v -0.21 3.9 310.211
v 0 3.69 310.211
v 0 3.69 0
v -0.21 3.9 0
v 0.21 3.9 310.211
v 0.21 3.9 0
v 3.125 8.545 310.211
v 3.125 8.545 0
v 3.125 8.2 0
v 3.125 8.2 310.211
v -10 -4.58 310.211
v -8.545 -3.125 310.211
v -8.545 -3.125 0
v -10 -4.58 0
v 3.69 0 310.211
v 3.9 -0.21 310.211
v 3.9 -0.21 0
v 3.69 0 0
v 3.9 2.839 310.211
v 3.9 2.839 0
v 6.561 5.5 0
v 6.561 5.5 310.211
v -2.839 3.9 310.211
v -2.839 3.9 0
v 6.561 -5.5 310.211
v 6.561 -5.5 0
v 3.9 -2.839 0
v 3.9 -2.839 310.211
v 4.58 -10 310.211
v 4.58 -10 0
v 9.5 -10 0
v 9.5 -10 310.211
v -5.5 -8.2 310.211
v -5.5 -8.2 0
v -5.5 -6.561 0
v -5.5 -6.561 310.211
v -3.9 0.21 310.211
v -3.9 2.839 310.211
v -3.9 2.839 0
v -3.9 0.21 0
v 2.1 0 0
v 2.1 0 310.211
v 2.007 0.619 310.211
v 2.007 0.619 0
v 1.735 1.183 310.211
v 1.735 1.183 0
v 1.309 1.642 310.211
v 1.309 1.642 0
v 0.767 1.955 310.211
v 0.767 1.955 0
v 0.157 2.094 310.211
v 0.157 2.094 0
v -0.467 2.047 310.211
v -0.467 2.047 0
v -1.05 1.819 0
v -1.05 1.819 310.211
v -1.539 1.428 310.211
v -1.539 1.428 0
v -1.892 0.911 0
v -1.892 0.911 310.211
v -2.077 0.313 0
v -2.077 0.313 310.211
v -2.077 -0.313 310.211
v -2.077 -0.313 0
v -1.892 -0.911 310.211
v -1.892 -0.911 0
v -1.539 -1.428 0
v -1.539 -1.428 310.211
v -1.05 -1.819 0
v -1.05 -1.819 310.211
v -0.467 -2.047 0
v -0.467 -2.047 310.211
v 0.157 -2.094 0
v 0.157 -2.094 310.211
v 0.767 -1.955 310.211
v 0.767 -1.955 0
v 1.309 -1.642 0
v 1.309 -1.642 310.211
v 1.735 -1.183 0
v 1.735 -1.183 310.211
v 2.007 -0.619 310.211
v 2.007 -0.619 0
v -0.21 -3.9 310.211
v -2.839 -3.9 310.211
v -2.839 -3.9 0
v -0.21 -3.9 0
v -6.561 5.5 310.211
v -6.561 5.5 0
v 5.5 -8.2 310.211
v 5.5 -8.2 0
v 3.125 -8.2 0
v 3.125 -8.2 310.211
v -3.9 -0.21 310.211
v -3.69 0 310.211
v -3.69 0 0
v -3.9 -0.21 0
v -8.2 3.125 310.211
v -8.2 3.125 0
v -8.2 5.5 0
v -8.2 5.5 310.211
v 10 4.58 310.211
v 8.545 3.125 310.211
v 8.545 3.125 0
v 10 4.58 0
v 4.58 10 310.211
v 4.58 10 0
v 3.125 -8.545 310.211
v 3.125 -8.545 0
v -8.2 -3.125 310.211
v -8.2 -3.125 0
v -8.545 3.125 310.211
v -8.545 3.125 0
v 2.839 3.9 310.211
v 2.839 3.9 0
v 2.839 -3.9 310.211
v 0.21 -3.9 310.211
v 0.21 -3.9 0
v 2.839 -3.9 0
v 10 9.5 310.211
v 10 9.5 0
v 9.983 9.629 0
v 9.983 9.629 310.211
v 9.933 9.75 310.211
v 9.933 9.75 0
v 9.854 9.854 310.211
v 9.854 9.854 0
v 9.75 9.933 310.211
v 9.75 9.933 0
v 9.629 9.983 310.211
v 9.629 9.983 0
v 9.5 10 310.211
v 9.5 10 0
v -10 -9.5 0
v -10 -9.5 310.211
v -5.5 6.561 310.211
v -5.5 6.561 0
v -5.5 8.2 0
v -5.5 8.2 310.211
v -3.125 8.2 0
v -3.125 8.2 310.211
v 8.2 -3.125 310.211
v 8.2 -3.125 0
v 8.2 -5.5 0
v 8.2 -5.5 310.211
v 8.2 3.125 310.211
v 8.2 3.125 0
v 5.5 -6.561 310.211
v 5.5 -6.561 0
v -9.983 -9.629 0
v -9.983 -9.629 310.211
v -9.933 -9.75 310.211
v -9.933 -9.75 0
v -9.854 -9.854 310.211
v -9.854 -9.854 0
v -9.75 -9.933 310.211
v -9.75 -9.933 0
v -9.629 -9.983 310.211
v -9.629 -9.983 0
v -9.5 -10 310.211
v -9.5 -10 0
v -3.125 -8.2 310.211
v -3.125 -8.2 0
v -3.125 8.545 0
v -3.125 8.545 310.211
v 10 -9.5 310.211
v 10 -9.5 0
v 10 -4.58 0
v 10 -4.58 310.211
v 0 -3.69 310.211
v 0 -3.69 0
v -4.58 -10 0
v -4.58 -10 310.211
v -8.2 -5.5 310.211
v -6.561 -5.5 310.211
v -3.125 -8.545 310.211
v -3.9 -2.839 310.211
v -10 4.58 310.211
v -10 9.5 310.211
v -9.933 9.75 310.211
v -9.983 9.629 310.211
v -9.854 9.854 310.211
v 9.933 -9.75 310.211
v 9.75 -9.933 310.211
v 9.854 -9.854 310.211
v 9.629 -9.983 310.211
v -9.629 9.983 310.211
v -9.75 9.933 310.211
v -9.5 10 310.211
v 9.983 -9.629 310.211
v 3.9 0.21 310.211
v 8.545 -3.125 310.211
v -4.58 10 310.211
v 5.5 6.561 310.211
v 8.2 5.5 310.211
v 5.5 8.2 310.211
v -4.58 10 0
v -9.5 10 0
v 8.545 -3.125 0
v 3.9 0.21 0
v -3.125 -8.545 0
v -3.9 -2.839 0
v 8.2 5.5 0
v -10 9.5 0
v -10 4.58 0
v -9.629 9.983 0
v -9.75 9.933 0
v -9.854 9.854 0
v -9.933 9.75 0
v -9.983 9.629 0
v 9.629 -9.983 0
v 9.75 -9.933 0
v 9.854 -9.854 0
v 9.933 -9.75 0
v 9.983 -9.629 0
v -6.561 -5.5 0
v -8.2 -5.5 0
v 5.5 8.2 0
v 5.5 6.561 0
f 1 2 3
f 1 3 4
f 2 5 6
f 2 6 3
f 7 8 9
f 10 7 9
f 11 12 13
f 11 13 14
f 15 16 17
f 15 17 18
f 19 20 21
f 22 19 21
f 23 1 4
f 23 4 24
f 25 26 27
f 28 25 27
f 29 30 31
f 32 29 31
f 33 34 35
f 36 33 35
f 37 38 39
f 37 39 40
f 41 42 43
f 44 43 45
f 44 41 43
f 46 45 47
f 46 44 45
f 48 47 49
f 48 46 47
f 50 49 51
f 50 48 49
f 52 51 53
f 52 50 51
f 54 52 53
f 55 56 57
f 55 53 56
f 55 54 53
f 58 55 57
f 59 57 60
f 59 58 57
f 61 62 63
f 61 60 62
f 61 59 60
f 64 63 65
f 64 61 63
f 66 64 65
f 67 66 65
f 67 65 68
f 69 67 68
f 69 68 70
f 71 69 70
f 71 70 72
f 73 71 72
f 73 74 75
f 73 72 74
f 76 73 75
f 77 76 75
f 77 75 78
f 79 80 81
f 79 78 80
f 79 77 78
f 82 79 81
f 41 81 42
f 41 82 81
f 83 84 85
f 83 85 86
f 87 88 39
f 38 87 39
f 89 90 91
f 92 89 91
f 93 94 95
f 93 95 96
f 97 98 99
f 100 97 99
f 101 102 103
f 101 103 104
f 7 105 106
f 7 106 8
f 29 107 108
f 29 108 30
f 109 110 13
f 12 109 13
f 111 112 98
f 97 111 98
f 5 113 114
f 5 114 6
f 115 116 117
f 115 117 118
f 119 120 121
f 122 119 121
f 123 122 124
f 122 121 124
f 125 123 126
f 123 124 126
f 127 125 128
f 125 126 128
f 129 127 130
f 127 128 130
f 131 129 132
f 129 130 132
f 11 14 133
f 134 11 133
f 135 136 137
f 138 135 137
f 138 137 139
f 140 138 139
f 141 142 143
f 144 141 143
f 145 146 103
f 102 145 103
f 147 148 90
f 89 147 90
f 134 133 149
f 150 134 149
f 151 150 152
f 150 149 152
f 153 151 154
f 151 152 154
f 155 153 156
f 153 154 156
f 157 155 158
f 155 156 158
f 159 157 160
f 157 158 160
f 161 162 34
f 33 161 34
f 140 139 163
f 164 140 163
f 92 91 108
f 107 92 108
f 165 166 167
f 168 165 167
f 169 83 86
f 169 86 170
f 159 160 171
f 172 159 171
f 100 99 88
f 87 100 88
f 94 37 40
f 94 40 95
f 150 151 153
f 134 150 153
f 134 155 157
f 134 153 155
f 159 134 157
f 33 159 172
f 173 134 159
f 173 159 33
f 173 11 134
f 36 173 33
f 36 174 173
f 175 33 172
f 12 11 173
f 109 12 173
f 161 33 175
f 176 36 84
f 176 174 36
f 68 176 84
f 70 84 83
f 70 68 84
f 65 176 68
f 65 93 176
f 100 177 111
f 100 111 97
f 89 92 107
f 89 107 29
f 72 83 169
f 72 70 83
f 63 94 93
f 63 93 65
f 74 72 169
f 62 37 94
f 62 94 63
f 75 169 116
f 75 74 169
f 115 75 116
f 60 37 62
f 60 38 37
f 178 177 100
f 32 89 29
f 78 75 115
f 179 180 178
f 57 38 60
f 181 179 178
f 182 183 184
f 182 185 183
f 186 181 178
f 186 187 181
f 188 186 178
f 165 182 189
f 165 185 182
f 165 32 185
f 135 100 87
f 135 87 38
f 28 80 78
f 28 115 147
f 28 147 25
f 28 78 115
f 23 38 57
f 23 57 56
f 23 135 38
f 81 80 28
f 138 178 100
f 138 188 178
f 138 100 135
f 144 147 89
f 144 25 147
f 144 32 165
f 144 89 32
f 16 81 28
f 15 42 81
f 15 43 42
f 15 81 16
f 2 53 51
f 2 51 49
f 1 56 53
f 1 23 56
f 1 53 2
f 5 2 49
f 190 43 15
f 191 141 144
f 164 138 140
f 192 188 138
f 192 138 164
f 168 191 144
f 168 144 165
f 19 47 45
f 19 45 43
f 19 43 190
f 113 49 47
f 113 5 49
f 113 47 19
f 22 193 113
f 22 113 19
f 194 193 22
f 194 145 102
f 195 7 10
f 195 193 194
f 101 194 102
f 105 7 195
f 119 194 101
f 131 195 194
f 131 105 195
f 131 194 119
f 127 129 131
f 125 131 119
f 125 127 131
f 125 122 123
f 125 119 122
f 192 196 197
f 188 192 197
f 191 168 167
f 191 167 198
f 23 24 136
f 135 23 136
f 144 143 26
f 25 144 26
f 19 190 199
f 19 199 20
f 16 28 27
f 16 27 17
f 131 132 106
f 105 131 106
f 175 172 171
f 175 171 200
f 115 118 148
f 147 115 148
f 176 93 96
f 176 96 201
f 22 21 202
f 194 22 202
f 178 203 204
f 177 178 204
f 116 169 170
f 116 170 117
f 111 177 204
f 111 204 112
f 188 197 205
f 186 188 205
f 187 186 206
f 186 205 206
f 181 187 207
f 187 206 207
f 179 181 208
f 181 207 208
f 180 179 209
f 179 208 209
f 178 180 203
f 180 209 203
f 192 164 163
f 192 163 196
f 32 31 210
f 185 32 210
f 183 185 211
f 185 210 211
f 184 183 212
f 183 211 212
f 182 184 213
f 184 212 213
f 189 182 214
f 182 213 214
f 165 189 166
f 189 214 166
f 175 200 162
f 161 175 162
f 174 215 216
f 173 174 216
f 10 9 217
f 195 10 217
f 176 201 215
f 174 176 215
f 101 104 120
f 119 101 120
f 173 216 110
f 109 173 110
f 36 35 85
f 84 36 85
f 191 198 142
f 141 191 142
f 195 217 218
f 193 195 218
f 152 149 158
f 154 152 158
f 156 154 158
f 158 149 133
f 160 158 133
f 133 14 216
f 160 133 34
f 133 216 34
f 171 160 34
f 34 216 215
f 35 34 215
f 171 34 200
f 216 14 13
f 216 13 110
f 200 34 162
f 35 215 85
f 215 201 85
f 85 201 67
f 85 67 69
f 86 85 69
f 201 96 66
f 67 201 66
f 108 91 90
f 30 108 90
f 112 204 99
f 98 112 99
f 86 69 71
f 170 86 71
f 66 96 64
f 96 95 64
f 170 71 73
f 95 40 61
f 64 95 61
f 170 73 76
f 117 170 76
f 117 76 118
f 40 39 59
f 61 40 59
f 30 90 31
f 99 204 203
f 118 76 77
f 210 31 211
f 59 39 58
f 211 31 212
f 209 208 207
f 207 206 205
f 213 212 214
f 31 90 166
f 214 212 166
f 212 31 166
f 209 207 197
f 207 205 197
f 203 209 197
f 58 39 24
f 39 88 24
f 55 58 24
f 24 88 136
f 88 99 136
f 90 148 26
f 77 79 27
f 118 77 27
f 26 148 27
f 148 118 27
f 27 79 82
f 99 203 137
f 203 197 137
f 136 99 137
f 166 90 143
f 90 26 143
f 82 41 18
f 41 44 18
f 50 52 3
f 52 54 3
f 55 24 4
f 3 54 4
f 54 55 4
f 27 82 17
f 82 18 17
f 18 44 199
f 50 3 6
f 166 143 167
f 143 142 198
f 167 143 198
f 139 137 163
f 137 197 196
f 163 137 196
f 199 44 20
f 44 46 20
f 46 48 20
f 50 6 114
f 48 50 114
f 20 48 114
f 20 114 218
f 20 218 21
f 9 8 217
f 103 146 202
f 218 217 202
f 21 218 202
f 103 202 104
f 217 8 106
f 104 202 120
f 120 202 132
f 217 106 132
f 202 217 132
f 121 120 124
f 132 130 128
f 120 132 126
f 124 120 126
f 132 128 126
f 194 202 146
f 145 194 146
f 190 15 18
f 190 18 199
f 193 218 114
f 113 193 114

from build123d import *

# Parameters (mm, degrees)
SKETCH1_R           = 2.1
BOSS_EXTRUDE1_DEPTH = 500
SKETCH2_W           = 54.342880418
SKETCH2_H           = 45.441204662
CUT_EXTRUDE1_DEPTH  = 189.7888


with BuildPart() as part:
    # Sketch1 → Boss-Extrude1 (new body)
    with BuildSketch(Plane.XY):
        with BuildLine():
            Line((4.58, -10), (9.5, -10))
            ThreePointArc((9.5, -10), (9.853553391, -9.853553391), (10, -9.5))
            Line((10, -9.5), (10, -4.58))
            Line((10, -4.58), (8.545, -3.125))
            Line((8.545, -3.125), (8.2, -3.125))
            Line((8.2, -3.125), (8.2, -5.5))
            Line((8.2, -5.5), (6.560660172, -5.5))
            Line((6.560660172, -5.5), (3.9, -2.839339828))
            Line((3.9, -2.839339828), (3.9, -0.21))
            Line((3.9, -0.21), (3.69, 0))
            Line((3.69, 0), (3.9, 0.21))
            Line((3.9, 0.21), (3.9, 2.839339828))
            Line((3.9, 2.839339828), (6.560660172, 5.5))
            Line((6.560660172, 5.5), (8.2, 5.5))
            Line((8.2, 5.5), (8.2, 3.125))
            Line((8.2, 3.125), (8.545, 3.125))
            Line((8.545, 3.125), (10, 4.58))
            Line((10, 4.58), (10, 9.5))
            ThreePointArc((10, 9.5), (9.853553391, 9.853553391), (9.5, 10))
            Line((9.5, 10), (4.58, 10))
            Line((4.58, 10), (3.125, 8.545))
            Line((3.125, 8.545), (3.125, 8.2))
            Line((3.125, 8.2), (5.5, 8.2))
            Line((5.5, 8.2), (5.5, 6.560660172))
            Line((5.5, 6.560660172), (2.839339828, 3.9))
            Line((2.839339828, 3.9), (0.21, 3.9))
            Line((0.21, 3.9), (0, 3.69))
            Line((0, 3.69), (-0.21, 3.9))
            Line((-0.21, 3.9), (-2.839339828, 3.9))
            Line((-2.839339828, 3.9), (-5.5, 6.560660172))
            Line((-5.5, 6.560660172), (-5.5, 8.2))
            Line((-5.5, 8.2), (-3.125, 8.2))
            Line((-3.125, 8.2), (-3.125, 8.545))
            Line((-3.125, 8.545), (-4.58, 10))
            Line((-4.58, 10), (-9.5, 10))
            ThreePointArc((-9.5, 10), (-9.853553391, 9.853553391), (-10, 9.5))
            Line((-10, 9.5), (-10, 4.58))
            Line((-10, 4.58), (-8.545, 3.125))
            Line((-8.545, 3.125), (-8.2, 3.125))
            Line((-8.2, 3.125), (-8.2, 5.5))
            Line((-8.2, 5.5), (-6.560660172, 5.5))
            Line((-6.560660172, 5.5), (-3.9, 2.839339828))
            Line((-3.9, 2.839339828), (-3.9, 0.21))
            Line((-3.9, 0.21), (-3.69, 0))
            Line((-3.69, 0), (-3.9, -0.21))
            Line((-3.9, -0.21), (-3.9, -2.839339828))
            Line((-3.9, -2.839339828), (-6.560660172, -5.5))
            Line((-6.560660172, -5.5), (-8.2, -5.5))
            Line((-8.2, -5.5), (-8.2, -3.125))
            Line((-8.2, -3.125), (-8.545, -3.125))
            Line((-8.545, -3.125), (-10, -4.58))
            Line((-10, -4.58), (-10, -9.5))
            ThreePointArc((-10, -9.5), (-9.853553391, -9.853553391), (-9.5, -10))
            Line((-9.5, -10), (-4.58, -10))
            Line((-4.58, -10), (-3.125, -8.545))
            Line((-3.125, -8.545), (-3.125, -8.2))
            Line((-3.125, -8.2), (-5.5, -8.2))
            Line((-5.5, -8.2), (-5.5, -6.560660172))
            Line((-5.5, -6.560660172), (-2.839339828, -3.9))
            Line((-2.839339828, -3.9), (-0.21, -3.9))
            Line((-0.21, -3.9), (0, -3.69))
            Line((0, -3.69), (0.21, -3.9))
            Line((0.21, -3.9), (2.839339828, -3.9))
            Line((2.839339828, -3.9), (5.5, -6.560660172))
            Line((5.5, -6.560660172), (5.5, -8.2))
            Line((5.5, -8.2), (3.125, -8.2))
            Line((3.125, -8.2), (3.125, -8.545))
            Line((3.125, -8.545), (4.58, -10))
        make_face()
        Circle(SKETCH1_R, mode=Mode.SUBTRACT)
    extrude(amount=BOSS_EXTRUDE1_DEPTH)

    # Sketch2 → Cut-Extrude1 (cut)
    with BuildSketch(Plane.XY.offset(500)):
        with Locations((-1.398235928, -4.31119066)):
            Rectangle(SKETCH2_W, SKETCH2_H)
    extrude(amount=-CUT_EXTRUDE1_DEPTH, mode=Mode.SUBTRACT)


solid = part.part
